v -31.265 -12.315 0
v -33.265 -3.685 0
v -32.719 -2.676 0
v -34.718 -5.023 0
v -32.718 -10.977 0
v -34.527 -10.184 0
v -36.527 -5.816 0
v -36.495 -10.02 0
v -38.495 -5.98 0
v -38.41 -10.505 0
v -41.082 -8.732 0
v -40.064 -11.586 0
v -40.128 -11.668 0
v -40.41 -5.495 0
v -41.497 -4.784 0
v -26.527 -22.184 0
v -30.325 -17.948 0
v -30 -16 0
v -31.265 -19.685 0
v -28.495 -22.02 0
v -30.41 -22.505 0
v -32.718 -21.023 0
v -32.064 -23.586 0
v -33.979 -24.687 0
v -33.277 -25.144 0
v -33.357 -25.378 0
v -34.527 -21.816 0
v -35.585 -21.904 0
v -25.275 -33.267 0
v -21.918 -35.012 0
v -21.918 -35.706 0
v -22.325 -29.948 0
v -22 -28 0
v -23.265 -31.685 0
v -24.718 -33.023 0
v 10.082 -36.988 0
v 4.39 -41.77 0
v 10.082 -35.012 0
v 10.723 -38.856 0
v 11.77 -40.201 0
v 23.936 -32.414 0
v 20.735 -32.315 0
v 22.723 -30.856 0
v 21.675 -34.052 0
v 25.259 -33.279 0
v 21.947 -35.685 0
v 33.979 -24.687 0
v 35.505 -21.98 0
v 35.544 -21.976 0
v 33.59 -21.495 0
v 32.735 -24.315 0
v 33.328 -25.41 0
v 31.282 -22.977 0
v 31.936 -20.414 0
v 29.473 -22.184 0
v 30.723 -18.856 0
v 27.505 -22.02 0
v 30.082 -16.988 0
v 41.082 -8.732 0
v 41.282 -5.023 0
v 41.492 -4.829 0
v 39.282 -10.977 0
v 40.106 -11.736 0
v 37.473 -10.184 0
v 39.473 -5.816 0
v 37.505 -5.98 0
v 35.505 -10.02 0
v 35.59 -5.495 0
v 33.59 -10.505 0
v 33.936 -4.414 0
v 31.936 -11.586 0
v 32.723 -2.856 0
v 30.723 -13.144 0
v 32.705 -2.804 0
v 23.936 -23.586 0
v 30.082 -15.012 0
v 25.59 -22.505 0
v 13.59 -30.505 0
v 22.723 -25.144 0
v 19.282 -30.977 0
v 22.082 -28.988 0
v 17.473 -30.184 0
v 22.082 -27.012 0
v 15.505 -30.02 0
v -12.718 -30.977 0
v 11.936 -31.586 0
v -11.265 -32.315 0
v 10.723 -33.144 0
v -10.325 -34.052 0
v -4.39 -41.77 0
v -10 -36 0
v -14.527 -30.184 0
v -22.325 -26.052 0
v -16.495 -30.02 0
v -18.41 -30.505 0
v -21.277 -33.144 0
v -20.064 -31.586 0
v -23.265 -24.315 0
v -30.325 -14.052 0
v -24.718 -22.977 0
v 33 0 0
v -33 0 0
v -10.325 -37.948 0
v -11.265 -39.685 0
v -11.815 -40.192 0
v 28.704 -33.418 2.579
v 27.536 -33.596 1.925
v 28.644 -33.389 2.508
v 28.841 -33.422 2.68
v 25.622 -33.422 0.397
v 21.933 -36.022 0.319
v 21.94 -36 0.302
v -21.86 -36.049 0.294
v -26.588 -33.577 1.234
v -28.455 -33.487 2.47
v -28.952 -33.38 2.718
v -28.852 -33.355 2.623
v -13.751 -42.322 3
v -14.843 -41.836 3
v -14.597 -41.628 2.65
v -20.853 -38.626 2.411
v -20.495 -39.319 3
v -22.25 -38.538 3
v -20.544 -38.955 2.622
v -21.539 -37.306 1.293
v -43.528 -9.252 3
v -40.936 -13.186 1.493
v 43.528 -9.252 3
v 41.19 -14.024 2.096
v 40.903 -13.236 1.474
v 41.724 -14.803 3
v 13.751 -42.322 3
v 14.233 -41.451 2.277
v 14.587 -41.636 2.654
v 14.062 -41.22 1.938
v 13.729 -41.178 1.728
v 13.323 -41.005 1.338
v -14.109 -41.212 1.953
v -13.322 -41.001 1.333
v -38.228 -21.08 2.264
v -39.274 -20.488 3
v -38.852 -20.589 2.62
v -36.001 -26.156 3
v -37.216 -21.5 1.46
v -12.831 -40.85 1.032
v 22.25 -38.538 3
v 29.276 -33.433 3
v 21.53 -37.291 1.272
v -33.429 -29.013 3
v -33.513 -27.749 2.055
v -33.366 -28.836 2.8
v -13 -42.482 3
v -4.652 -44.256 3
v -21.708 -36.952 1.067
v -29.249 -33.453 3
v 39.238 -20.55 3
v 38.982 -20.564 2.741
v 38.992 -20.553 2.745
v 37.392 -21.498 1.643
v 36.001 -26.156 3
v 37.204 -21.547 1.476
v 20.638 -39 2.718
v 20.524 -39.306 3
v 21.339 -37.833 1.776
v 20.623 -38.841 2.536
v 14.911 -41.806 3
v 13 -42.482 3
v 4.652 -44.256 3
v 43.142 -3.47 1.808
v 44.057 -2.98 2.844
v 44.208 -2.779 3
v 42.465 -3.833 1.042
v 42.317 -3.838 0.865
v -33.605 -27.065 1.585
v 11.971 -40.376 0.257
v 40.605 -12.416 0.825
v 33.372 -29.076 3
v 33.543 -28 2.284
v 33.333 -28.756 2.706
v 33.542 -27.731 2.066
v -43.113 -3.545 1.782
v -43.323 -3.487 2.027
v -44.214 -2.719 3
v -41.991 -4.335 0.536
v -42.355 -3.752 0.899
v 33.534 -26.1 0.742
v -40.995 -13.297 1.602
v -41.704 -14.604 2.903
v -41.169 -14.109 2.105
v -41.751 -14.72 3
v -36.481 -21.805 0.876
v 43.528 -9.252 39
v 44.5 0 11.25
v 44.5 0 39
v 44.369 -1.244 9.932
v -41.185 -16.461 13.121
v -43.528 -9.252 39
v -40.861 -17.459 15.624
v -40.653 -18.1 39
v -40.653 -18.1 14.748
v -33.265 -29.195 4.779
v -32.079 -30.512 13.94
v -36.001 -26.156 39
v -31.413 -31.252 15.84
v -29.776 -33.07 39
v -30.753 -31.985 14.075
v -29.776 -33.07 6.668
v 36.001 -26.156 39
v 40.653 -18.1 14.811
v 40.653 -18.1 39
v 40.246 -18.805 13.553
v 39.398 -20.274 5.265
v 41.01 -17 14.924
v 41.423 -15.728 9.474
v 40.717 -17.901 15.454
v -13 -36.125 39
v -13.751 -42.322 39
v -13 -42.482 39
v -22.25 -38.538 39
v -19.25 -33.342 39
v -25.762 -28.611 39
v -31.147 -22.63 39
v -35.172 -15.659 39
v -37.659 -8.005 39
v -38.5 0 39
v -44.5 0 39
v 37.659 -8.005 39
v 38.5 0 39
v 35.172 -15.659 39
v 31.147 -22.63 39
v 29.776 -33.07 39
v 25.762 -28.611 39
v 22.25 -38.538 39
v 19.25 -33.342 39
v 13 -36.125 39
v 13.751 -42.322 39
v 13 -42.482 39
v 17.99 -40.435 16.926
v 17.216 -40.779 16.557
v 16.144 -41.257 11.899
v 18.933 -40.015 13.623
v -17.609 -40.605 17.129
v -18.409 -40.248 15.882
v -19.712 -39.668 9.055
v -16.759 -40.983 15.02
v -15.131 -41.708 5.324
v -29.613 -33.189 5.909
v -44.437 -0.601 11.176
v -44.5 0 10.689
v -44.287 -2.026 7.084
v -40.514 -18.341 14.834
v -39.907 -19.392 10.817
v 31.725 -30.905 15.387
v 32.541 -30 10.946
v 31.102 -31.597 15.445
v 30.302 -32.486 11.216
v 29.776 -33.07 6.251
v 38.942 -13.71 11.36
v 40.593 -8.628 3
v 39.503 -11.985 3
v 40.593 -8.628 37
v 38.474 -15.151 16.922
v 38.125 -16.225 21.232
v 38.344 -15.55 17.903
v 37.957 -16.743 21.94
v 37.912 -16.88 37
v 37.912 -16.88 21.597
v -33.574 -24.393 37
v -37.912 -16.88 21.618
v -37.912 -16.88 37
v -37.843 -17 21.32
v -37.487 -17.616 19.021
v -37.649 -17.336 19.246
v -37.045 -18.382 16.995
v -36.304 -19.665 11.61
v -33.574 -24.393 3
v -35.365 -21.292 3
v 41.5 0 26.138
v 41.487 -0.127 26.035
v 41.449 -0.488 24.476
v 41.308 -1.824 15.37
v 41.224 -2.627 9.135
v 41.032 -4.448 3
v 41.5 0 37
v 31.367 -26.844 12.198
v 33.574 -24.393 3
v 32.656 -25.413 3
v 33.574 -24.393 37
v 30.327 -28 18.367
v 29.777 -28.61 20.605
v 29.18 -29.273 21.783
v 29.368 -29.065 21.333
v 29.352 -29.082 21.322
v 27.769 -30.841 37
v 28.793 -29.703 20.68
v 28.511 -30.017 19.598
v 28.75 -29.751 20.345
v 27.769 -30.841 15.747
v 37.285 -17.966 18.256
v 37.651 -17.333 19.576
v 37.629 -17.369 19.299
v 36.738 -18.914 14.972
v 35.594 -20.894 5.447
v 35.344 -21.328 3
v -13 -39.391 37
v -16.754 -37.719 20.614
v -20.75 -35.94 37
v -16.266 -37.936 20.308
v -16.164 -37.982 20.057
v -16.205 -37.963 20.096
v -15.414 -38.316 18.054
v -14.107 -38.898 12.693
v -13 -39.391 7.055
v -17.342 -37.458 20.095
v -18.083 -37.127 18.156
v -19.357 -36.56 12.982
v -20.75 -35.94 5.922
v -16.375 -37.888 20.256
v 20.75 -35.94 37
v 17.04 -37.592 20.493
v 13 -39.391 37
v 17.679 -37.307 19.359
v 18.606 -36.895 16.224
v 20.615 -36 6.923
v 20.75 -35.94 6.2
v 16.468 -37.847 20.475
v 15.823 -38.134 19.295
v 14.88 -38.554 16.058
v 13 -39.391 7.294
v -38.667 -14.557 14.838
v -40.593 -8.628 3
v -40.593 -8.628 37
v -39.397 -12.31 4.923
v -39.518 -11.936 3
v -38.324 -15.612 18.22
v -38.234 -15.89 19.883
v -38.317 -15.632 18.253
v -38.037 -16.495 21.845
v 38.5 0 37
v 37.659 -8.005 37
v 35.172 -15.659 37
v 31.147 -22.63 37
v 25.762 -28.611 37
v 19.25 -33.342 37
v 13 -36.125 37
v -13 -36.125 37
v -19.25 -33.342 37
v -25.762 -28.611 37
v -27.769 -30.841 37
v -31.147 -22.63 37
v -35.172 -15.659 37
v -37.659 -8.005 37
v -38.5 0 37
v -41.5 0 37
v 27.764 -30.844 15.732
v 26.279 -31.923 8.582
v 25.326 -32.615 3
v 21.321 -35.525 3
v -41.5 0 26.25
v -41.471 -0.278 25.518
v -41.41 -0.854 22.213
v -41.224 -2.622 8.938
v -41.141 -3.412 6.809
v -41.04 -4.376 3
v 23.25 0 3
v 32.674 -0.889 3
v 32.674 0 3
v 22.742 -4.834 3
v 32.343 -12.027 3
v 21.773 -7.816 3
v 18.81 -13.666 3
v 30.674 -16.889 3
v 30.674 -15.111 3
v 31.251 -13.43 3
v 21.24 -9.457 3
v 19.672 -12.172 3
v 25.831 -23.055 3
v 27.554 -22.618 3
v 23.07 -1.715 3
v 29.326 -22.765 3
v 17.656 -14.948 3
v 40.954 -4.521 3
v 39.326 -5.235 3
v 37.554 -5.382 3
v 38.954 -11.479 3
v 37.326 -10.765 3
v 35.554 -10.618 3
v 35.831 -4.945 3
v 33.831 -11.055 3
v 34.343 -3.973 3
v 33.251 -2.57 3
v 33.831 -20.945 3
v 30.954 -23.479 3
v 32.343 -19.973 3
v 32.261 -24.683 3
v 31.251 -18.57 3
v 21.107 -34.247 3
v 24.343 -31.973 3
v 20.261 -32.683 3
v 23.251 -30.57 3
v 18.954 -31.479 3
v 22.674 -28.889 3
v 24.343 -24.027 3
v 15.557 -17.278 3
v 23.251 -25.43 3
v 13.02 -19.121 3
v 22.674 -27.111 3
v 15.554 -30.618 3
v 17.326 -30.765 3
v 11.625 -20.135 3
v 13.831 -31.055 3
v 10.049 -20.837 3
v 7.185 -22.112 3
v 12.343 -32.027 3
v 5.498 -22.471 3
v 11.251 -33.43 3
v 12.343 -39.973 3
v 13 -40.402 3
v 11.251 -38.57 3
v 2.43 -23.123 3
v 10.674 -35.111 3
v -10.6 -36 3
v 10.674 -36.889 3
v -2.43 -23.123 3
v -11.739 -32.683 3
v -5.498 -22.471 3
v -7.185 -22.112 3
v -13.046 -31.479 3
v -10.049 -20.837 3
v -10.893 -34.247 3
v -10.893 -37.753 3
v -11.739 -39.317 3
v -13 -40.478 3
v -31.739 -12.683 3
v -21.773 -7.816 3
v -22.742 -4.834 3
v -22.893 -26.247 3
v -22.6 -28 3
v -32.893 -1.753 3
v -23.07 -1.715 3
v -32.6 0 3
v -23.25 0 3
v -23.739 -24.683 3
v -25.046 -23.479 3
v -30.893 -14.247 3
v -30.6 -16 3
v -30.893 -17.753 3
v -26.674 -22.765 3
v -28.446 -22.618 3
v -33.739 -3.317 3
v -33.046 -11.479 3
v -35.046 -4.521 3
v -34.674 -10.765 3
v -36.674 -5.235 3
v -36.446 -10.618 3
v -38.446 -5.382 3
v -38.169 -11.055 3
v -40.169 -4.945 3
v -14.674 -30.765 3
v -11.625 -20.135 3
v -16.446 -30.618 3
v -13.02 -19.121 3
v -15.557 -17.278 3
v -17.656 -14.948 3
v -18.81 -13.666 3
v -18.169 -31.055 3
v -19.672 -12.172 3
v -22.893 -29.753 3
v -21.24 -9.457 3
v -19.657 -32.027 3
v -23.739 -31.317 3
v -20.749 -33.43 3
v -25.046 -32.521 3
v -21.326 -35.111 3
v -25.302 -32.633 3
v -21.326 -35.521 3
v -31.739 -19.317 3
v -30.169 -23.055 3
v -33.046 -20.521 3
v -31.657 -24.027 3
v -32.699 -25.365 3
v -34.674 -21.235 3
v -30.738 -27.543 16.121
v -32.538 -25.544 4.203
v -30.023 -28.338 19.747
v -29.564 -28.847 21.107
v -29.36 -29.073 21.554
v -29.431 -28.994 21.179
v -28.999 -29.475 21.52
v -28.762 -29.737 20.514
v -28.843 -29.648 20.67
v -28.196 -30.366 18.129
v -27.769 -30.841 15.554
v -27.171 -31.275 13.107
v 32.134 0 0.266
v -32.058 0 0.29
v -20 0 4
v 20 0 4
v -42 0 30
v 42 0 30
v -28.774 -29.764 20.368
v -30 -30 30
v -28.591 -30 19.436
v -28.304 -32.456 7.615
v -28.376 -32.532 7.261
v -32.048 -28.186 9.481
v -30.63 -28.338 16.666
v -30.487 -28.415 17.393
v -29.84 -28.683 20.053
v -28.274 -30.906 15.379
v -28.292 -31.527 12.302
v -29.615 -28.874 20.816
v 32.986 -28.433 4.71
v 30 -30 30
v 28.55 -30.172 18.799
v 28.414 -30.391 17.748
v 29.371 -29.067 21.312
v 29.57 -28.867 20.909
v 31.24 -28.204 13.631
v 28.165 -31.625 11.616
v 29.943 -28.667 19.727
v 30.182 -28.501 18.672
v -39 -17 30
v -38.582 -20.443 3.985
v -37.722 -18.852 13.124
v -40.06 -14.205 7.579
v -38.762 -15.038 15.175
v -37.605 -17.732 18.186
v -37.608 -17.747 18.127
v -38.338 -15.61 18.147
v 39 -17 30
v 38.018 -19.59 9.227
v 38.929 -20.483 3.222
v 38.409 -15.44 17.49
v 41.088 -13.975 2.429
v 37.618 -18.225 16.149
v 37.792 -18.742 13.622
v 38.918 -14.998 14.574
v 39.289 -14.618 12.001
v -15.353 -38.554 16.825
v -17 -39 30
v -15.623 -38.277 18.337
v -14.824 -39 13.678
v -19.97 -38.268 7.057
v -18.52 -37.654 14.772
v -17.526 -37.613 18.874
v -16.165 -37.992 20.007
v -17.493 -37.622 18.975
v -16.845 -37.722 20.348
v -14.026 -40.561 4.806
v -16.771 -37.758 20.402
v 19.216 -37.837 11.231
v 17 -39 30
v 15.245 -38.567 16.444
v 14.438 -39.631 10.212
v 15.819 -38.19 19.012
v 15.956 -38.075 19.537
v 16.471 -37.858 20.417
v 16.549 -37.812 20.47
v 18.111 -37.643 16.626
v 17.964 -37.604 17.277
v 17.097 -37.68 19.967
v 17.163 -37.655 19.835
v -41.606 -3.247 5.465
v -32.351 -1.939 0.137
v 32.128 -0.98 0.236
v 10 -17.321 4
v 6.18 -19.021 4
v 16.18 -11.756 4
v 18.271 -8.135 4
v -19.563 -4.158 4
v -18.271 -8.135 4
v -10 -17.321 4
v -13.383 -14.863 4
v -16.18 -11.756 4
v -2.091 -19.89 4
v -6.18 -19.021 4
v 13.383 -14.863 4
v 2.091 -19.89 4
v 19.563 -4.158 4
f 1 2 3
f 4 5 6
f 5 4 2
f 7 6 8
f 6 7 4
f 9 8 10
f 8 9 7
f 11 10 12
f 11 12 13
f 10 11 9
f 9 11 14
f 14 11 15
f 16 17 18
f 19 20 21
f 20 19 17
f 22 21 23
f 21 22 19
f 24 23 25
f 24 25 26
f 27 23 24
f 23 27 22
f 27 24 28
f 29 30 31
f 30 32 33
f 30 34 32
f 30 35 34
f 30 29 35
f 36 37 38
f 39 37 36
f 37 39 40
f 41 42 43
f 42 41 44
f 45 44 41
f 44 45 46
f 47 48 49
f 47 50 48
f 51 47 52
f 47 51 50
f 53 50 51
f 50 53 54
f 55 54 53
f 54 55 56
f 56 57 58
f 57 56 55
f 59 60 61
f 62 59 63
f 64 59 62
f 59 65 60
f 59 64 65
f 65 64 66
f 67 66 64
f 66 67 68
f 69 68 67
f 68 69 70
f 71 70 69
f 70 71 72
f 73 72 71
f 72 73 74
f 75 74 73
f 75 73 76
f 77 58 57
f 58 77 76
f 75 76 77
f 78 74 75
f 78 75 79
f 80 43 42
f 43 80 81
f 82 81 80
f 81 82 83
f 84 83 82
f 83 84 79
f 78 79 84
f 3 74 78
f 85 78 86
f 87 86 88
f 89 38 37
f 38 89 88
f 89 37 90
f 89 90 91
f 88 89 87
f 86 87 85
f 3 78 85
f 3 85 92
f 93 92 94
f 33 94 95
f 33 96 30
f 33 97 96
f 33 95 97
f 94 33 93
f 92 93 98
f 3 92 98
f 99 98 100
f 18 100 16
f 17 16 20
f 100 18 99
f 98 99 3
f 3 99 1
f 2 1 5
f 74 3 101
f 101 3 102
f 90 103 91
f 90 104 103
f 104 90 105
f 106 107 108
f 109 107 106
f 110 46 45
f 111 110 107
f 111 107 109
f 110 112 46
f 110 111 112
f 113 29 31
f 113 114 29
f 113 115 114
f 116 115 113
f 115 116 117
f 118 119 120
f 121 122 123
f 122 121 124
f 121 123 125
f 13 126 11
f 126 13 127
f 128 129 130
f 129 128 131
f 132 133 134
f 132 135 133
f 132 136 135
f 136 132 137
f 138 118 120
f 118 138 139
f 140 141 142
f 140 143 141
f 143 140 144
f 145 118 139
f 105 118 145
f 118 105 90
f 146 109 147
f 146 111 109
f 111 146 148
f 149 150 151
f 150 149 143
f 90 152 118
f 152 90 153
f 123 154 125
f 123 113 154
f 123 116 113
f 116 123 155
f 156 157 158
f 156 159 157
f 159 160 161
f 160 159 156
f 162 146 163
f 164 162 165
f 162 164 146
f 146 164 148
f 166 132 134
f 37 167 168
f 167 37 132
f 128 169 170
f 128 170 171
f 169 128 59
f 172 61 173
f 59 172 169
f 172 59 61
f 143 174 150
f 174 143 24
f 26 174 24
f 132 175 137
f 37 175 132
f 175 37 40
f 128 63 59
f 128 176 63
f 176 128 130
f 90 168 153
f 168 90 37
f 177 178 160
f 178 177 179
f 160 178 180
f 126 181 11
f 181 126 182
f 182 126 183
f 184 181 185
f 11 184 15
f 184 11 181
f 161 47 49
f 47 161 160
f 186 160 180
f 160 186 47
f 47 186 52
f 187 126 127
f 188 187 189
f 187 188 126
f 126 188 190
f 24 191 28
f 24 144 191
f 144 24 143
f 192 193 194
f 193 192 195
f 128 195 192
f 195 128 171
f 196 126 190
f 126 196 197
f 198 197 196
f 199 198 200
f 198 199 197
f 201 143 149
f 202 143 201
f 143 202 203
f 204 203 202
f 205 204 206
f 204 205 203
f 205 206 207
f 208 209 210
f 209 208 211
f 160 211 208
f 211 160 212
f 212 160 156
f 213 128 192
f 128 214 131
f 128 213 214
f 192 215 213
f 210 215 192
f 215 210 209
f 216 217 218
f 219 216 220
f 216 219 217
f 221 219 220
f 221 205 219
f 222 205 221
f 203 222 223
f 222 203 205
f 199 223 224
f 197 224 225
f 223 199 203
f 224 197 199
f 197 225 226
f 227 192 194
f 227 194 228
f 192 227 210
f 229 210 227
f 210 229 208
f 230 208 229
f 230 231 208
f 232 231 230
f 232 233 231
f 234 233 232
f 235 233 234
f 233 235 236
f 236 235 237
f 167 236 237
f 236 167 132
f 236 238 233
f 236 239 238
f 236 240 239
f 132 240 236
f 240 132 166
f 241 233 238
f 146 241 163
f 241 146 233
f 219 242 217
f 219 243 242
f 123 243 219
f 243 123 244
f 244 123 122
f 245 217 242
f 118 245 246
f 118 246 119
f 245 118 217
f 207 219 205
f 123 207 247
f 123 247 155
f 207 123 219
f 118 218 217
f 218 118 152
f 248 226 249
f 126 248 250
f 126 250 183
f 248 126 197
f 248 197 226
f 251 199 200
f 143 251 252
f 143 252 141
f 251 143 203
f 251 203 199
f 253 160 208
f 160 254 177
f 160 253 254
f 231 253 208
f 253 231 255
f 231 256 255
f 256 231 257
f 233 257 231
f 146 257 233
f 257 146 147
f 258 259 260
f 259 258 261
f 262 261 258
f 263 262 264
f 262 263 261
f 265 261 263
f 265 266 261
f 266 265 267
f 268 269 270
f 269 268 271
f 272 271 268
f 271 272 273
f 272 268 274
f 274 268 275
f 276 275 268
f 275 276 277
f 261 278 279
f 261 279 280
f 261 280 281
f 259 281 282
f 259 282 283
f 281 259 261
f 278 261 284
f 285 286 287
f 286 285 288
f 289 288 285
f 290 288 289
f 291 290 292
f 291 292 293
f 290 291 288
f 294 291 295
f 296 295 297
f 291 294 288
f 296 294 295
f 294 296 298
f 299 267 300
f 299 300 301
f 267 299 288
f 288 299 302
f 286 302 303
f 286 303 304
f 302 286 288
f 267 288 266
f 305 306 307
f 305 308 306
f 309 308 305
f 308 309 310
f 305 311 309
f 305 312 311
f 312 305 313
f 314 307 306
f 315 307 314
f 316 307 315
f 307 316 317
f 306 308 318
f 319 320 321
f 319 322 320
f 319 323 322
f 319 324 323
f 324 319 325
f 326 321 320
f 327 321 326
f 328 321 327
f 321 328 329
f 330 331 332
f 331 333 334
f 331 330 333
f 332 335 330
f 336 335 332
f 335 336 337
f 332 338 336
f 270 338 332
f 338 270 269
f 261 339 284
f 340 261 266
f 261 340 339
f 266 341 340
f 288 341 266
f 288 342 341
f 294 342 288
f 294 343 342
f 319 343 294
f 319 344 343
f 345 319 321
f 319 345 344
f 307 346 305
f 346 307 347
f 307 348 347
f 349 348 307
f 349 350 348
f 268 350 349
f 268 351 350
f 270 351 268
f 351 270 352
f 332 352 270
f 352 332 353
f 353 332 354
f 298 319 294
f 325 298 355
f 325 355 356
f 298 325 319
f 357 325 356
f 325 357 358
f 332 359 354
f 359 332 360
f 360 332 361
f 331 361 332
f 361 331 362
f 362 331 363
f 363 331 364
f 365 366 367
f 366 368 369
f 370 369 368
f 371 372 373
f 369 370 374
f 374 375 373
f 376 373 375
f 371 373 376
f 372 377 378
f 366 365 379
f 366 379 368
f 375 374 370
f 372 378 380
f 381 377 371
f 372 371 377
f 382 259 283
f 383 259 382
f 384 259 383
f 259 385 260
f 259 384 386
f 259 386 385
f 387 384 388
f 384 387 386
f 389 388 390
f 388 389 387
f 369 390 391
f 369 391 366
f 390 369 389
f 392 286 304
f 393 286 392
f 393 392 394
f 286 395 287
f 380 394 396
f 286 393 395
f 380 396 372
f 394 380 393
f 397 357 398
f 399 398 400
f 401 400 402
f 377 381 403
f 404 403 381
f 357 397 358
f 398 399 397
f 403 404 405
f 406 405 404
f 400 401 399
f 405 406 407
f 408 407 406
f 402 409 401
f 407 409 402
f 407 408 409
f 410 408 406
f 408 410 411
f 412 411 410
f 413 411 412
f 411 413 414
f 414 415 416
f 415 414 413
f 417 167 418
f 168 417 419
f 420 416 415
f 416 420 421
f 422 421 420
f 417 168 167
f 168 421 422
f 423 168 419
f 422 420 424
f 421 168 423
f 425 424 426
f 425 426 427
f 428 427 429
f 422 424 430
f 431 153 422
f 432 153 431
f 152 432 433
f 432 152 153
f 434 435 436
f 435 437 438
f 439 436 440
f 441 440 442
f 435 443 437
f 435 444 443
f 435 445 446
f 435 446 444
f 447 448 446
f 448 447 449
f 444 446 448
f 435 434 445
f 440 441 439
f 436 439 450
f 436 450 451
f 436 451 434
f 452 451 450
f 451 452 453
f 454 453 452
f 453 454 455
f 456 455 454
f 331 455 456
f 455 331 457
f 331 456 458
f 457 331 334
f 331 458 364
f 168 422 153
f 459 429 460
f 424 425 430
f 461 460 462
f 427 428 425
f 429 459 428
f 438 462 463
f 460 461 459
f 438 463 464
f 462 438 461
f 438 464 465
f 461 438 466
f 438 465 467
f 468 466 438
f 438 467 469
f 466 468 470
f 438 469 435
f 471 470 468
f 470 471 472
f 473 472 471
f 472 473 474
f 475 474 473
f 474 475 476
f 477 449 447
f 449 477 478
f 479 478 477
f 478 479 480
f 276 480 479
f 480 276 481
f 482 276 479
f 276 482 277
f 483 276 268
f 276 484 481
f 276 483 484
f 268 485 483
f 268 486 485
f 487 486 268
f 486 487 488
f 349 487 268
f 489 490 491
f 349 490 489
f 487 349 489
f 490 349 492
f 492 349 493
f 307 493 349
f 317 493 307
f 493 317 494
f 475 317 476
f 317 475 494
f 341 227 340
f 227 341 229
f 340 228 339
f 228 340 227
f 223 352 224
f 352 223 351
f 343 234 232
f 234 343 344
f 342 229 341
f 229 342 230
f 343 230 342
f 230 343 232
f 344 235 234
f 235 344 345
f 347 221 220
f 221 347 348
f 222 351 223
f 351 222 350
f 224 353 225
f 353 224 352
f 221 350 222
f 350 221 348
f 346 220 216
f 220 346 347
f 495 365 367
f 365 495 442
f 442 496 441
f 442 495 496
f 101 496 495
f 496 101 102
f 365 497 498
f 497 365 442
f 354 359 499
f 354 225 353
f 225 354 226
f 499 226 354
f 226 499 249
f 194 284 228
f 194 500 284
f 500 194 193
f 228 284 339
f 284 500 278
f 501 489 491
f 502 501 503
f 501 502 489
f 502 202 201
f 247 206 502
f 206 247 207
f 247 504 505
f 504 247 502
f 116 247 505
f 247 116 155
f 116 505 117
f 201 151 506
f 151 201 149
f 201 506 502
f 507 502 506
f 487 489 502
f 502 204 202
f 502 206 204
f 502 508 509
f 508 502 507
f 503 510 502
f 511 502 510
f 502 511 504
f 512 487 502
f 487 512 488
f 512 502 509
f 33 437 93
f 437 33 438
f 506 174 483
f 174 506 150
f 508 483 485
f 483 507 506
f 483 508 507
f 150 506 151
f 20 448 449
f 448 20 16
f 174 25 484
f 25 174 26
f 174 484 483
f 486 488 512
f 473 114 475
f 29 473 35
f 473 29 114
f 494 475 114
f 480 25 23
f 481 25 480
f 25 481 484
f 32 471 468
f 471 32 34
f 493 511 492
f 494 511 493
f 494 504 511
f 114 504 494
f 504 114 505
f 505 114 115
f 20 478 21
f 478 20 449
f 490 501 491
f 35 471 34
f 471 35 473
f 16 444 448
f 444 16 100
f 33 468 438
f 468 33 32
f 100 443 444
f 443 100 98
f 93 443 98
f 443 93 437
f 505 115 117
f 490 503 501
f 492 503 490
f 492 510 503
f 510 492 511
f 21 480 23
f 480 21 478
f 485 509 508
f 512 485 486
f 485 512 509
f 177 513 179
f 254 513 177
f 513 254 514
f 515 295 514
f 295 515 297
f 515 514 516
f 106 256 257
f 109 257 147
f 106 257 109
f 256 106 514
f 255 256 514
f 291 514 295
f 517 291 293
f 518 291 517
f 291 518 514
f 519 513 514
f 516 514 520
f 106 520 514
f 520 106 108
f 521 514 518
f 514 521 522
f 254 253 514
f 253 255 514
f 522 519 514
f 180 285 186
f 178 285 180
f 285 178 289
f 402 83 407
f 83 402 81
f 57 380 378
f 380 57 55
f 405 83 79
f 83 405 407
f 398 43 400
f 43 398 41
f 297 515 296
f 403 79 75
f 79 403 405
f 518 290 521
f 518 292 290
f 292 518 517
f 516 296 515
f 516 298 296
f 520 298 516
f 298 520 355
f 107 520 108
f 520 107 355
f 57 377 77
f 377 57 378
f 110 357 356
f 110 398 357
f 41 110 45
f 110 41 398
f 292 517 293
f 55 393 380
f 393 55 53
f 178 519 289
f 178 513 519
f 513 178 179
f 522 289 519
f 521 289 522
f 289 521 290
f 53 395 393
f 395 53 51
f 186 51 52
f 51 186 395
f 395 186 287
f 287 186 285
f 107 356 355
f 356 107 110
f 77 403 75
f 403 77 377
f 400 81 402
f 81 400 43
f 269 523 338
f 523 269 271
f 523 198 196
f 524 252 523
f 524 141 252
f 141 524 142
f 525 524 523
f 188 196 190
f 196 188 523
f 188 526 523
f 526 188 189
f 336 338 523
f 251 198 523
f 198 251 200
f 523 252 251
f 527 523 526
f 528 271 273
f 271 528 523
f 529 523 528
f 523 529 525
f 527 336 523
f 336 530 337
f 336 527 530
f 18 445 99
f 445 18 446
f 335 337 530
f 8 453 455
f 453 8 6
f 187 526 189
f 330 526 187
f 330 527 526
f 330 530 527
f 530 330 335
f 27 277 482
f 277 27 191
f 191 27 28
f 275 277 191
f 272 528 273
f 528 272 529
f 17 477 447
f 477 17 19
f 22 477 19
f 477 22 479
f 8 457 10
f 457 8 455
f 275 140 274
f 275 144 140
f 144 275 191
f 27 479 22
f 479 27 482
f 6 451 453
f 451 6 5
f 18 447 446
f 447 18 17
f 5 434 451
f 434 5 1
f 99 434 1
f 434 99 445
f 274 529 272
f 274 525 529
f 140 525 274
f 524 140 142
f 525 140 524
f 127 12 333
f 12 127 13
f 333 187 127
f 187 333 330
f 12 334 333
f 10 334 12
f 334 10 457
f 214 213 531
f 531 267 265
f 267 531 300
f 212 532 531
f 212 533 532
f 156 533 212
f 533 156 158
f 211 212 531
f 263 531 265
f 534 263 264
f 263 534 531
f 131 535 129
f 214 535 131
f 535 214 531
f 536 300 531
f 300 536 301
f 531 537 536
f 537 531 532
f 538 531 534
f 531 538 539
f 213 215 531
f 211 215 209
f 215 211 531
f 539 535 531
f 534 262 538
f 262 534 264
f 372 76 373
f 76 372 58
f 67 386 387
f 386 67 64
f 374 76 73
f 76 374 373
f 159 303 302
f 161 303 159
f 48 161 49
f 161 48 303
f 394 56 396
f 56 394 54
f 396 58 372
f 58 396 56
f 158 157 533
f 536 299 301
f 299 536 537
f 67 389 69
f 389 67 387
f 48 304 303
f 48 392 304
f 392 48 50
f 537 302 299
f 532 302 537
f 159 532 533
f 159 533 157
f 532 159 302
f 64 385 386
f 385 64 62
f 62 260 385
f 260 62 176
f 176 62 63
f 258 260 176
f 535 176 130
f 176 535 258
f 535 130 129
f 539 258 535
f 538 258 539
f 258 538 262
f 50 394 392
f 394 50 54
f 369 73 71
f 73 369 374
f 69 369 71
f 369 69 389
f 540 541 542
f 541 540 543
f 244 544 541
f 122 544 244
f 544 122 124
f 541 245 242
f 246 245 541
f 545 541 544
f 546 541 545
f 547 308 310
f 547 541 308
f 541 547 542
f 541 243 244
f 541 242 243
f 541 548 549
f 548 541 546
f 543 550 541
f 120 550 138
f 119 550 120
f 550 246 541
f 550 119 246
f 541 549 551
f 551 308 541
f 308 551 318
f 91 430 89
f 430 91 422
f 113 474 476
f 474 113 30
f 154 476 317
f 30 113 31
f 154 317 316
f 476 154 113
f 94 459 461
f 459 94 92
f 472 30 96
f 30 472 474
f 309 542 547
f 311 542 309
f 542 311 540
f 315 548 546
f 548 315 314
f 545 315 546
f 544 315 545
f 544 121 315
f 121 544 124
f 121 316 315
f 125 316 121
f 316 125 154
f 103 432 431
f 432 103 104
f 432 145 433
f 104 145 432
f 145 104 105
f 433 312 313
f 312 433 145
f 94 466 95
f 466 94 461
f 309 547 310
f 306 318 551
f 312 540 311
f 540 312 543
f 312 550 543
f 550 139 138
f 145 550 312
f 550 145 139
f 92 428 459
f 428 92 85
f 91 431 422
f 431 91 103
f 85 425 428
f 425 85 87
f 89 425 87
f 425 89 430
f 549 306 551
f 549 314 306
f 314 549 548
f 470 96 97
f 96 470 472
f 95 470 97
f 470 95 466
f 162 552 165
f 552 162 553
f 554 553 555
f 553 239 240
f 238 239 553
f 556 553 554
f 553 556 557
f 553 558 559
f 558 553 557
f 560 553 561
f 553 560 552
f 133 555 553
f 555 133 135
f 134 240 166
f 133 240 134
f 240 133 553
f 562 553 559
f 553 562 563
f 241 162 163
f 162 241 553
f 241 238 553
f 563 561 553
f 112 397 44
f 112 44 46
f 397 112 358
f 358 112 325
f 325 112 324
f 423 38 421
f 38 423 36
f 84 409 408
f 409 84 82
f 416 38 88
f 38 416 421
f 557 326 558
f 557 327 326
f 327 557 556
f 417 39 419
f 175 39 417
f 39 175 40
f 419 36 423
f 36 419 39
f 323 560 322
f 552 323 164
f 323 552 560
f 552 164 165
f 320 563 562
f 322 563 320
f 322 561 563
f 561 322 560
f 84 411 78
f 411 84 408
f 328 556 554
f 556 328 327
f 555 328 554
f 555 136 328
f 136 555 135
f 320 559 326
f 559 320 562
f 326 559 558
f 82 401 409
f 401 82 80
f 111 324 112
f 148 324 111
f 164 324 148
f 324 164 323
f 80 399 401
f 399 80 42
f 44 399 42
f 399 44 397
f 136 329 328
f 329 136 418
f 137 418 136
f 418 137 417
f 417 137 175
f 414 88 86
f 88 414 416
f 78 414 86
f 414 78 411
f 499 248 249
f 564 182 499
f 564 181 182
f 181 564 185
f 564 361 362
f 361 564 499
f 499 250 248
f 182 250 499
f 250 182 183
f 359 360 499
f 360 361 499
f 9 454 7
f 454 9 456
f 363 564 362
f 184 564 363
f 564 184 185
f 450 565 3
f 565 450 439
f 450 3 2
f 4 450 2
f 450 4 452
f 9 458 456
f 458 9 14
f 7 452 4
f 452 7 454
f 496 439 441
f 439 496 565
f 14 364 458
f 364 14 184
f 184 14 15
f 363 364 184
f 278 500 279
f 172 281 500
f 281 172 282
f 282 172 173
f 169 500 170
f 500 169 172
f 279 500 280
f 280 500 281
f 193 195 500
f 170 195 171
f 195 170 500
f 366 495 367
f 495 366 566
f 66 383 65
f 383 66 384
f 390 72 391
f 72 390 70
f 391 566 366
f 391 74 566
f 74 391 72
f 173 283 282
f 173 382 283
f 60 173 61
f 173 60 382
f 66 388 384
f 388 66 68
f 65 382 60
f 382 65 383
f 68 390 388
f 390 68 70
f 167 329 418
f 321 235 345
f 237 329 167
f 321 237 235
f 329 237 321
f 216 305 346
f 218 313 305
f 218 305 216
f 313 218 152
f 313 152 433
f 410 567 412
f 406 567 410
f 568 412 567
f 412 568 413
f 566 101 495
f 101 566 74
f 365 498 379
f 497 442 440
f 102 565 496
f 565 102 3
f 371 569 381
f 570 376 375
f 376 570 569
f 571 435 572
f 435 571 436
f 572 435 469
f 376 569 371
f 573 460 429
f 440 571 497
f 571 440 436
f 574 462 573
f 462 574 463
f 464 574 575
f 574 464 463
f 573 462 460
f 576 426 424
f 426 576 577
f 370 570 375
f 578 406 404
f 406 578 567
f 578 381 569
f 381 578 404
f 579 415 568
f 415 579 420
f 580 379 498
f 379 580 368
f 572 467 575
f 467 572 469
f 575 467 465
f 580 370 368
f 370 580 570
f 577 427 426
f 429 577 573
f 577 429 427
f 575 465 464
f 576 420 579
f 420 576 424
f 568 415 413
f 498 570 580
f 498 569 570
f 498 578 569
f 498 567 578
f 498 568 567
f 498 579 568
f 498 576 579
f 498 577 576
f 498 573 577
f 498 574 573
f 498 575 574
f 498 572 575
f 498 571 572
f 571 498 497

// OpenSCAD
difference(){
	union(){
		cylinder(h=3,r1=42,r2=44.5,center=false);
		translate([0,0,3]){
			cylinder(h=36,r=44.5,center=false);
		}

	}
	translate([0,0,3]){
		cylinder(h=34,r=41.5,center=false);
		cylinder(h=100,r=38.5,center=false);
	}
	translate([-50,0,0]){
		cube([100,50,100]);
	}

	translate([-30,-30,0]){
		cylinder(h=30,r1=4,r2=0,center=false);
	}
	translate([-28,-28,0]){
		cylinder(h=30,r1=6,r2=0,center=false);
	}
	translate([30,-30,0]){
		cylinder(h=30,r1=4,r2=0,center=false);
	}
	translate([28,-28,0]){
		cylinder(h=30,r1=6,r2=0,center=false);
	}

	translate([-39,-17,0]){
		cylinder(h=30,r1=4,r2=0,center=false);
	}
	translate([-36,-16,0]){
		cylinder(h=30,r1=6,r2=0,center=false);
	}
	translate([39,-17,0]){
		cylinder(h=30,r1=4,r2=0,center=false);
	}
	translate([36,-16,0]){
		cylinder(h=30,r1=6,r2=0,center=false);
	}
	translate([-17,-39,0]){
		cylinder(h=30,r1=4,r2=0,center=false);
	}
	translate([-16,-36,0]){
		cylinder(h=30,r1=6,r2=0,center=false);
	}
	translate([17,-39,0]){
		cylinder(h=30,r1=4,r2=0,center=false);
	}
	translate([16,-36,0]){
		cylinder(h=30,r1=6,r2=0,center=false);
	}
	translate([-42,0,0]){
		cylinder(h=30,r1=4,r2=0,center=false);
	}
	translate([-38,0,0]){
		cylinder(h=30,r1=6,r2=0,center=false);
	}
	translate([42,0,0]){
		cylinder(h=30,r1=4,r2=0,center=false);
	}
	translate([38,0,0]){
		cylinder(h=30,r1=6,r2=0,center=false);
	}
	translate([-13,-46,3]){
		cube([26,15,100]);
	}
}
difference(){
	cylinder(h=4,r1=33,r2=20,centre=false);
	translate([-50,0,0]){
		cube([100,50,100]);
	}
}
